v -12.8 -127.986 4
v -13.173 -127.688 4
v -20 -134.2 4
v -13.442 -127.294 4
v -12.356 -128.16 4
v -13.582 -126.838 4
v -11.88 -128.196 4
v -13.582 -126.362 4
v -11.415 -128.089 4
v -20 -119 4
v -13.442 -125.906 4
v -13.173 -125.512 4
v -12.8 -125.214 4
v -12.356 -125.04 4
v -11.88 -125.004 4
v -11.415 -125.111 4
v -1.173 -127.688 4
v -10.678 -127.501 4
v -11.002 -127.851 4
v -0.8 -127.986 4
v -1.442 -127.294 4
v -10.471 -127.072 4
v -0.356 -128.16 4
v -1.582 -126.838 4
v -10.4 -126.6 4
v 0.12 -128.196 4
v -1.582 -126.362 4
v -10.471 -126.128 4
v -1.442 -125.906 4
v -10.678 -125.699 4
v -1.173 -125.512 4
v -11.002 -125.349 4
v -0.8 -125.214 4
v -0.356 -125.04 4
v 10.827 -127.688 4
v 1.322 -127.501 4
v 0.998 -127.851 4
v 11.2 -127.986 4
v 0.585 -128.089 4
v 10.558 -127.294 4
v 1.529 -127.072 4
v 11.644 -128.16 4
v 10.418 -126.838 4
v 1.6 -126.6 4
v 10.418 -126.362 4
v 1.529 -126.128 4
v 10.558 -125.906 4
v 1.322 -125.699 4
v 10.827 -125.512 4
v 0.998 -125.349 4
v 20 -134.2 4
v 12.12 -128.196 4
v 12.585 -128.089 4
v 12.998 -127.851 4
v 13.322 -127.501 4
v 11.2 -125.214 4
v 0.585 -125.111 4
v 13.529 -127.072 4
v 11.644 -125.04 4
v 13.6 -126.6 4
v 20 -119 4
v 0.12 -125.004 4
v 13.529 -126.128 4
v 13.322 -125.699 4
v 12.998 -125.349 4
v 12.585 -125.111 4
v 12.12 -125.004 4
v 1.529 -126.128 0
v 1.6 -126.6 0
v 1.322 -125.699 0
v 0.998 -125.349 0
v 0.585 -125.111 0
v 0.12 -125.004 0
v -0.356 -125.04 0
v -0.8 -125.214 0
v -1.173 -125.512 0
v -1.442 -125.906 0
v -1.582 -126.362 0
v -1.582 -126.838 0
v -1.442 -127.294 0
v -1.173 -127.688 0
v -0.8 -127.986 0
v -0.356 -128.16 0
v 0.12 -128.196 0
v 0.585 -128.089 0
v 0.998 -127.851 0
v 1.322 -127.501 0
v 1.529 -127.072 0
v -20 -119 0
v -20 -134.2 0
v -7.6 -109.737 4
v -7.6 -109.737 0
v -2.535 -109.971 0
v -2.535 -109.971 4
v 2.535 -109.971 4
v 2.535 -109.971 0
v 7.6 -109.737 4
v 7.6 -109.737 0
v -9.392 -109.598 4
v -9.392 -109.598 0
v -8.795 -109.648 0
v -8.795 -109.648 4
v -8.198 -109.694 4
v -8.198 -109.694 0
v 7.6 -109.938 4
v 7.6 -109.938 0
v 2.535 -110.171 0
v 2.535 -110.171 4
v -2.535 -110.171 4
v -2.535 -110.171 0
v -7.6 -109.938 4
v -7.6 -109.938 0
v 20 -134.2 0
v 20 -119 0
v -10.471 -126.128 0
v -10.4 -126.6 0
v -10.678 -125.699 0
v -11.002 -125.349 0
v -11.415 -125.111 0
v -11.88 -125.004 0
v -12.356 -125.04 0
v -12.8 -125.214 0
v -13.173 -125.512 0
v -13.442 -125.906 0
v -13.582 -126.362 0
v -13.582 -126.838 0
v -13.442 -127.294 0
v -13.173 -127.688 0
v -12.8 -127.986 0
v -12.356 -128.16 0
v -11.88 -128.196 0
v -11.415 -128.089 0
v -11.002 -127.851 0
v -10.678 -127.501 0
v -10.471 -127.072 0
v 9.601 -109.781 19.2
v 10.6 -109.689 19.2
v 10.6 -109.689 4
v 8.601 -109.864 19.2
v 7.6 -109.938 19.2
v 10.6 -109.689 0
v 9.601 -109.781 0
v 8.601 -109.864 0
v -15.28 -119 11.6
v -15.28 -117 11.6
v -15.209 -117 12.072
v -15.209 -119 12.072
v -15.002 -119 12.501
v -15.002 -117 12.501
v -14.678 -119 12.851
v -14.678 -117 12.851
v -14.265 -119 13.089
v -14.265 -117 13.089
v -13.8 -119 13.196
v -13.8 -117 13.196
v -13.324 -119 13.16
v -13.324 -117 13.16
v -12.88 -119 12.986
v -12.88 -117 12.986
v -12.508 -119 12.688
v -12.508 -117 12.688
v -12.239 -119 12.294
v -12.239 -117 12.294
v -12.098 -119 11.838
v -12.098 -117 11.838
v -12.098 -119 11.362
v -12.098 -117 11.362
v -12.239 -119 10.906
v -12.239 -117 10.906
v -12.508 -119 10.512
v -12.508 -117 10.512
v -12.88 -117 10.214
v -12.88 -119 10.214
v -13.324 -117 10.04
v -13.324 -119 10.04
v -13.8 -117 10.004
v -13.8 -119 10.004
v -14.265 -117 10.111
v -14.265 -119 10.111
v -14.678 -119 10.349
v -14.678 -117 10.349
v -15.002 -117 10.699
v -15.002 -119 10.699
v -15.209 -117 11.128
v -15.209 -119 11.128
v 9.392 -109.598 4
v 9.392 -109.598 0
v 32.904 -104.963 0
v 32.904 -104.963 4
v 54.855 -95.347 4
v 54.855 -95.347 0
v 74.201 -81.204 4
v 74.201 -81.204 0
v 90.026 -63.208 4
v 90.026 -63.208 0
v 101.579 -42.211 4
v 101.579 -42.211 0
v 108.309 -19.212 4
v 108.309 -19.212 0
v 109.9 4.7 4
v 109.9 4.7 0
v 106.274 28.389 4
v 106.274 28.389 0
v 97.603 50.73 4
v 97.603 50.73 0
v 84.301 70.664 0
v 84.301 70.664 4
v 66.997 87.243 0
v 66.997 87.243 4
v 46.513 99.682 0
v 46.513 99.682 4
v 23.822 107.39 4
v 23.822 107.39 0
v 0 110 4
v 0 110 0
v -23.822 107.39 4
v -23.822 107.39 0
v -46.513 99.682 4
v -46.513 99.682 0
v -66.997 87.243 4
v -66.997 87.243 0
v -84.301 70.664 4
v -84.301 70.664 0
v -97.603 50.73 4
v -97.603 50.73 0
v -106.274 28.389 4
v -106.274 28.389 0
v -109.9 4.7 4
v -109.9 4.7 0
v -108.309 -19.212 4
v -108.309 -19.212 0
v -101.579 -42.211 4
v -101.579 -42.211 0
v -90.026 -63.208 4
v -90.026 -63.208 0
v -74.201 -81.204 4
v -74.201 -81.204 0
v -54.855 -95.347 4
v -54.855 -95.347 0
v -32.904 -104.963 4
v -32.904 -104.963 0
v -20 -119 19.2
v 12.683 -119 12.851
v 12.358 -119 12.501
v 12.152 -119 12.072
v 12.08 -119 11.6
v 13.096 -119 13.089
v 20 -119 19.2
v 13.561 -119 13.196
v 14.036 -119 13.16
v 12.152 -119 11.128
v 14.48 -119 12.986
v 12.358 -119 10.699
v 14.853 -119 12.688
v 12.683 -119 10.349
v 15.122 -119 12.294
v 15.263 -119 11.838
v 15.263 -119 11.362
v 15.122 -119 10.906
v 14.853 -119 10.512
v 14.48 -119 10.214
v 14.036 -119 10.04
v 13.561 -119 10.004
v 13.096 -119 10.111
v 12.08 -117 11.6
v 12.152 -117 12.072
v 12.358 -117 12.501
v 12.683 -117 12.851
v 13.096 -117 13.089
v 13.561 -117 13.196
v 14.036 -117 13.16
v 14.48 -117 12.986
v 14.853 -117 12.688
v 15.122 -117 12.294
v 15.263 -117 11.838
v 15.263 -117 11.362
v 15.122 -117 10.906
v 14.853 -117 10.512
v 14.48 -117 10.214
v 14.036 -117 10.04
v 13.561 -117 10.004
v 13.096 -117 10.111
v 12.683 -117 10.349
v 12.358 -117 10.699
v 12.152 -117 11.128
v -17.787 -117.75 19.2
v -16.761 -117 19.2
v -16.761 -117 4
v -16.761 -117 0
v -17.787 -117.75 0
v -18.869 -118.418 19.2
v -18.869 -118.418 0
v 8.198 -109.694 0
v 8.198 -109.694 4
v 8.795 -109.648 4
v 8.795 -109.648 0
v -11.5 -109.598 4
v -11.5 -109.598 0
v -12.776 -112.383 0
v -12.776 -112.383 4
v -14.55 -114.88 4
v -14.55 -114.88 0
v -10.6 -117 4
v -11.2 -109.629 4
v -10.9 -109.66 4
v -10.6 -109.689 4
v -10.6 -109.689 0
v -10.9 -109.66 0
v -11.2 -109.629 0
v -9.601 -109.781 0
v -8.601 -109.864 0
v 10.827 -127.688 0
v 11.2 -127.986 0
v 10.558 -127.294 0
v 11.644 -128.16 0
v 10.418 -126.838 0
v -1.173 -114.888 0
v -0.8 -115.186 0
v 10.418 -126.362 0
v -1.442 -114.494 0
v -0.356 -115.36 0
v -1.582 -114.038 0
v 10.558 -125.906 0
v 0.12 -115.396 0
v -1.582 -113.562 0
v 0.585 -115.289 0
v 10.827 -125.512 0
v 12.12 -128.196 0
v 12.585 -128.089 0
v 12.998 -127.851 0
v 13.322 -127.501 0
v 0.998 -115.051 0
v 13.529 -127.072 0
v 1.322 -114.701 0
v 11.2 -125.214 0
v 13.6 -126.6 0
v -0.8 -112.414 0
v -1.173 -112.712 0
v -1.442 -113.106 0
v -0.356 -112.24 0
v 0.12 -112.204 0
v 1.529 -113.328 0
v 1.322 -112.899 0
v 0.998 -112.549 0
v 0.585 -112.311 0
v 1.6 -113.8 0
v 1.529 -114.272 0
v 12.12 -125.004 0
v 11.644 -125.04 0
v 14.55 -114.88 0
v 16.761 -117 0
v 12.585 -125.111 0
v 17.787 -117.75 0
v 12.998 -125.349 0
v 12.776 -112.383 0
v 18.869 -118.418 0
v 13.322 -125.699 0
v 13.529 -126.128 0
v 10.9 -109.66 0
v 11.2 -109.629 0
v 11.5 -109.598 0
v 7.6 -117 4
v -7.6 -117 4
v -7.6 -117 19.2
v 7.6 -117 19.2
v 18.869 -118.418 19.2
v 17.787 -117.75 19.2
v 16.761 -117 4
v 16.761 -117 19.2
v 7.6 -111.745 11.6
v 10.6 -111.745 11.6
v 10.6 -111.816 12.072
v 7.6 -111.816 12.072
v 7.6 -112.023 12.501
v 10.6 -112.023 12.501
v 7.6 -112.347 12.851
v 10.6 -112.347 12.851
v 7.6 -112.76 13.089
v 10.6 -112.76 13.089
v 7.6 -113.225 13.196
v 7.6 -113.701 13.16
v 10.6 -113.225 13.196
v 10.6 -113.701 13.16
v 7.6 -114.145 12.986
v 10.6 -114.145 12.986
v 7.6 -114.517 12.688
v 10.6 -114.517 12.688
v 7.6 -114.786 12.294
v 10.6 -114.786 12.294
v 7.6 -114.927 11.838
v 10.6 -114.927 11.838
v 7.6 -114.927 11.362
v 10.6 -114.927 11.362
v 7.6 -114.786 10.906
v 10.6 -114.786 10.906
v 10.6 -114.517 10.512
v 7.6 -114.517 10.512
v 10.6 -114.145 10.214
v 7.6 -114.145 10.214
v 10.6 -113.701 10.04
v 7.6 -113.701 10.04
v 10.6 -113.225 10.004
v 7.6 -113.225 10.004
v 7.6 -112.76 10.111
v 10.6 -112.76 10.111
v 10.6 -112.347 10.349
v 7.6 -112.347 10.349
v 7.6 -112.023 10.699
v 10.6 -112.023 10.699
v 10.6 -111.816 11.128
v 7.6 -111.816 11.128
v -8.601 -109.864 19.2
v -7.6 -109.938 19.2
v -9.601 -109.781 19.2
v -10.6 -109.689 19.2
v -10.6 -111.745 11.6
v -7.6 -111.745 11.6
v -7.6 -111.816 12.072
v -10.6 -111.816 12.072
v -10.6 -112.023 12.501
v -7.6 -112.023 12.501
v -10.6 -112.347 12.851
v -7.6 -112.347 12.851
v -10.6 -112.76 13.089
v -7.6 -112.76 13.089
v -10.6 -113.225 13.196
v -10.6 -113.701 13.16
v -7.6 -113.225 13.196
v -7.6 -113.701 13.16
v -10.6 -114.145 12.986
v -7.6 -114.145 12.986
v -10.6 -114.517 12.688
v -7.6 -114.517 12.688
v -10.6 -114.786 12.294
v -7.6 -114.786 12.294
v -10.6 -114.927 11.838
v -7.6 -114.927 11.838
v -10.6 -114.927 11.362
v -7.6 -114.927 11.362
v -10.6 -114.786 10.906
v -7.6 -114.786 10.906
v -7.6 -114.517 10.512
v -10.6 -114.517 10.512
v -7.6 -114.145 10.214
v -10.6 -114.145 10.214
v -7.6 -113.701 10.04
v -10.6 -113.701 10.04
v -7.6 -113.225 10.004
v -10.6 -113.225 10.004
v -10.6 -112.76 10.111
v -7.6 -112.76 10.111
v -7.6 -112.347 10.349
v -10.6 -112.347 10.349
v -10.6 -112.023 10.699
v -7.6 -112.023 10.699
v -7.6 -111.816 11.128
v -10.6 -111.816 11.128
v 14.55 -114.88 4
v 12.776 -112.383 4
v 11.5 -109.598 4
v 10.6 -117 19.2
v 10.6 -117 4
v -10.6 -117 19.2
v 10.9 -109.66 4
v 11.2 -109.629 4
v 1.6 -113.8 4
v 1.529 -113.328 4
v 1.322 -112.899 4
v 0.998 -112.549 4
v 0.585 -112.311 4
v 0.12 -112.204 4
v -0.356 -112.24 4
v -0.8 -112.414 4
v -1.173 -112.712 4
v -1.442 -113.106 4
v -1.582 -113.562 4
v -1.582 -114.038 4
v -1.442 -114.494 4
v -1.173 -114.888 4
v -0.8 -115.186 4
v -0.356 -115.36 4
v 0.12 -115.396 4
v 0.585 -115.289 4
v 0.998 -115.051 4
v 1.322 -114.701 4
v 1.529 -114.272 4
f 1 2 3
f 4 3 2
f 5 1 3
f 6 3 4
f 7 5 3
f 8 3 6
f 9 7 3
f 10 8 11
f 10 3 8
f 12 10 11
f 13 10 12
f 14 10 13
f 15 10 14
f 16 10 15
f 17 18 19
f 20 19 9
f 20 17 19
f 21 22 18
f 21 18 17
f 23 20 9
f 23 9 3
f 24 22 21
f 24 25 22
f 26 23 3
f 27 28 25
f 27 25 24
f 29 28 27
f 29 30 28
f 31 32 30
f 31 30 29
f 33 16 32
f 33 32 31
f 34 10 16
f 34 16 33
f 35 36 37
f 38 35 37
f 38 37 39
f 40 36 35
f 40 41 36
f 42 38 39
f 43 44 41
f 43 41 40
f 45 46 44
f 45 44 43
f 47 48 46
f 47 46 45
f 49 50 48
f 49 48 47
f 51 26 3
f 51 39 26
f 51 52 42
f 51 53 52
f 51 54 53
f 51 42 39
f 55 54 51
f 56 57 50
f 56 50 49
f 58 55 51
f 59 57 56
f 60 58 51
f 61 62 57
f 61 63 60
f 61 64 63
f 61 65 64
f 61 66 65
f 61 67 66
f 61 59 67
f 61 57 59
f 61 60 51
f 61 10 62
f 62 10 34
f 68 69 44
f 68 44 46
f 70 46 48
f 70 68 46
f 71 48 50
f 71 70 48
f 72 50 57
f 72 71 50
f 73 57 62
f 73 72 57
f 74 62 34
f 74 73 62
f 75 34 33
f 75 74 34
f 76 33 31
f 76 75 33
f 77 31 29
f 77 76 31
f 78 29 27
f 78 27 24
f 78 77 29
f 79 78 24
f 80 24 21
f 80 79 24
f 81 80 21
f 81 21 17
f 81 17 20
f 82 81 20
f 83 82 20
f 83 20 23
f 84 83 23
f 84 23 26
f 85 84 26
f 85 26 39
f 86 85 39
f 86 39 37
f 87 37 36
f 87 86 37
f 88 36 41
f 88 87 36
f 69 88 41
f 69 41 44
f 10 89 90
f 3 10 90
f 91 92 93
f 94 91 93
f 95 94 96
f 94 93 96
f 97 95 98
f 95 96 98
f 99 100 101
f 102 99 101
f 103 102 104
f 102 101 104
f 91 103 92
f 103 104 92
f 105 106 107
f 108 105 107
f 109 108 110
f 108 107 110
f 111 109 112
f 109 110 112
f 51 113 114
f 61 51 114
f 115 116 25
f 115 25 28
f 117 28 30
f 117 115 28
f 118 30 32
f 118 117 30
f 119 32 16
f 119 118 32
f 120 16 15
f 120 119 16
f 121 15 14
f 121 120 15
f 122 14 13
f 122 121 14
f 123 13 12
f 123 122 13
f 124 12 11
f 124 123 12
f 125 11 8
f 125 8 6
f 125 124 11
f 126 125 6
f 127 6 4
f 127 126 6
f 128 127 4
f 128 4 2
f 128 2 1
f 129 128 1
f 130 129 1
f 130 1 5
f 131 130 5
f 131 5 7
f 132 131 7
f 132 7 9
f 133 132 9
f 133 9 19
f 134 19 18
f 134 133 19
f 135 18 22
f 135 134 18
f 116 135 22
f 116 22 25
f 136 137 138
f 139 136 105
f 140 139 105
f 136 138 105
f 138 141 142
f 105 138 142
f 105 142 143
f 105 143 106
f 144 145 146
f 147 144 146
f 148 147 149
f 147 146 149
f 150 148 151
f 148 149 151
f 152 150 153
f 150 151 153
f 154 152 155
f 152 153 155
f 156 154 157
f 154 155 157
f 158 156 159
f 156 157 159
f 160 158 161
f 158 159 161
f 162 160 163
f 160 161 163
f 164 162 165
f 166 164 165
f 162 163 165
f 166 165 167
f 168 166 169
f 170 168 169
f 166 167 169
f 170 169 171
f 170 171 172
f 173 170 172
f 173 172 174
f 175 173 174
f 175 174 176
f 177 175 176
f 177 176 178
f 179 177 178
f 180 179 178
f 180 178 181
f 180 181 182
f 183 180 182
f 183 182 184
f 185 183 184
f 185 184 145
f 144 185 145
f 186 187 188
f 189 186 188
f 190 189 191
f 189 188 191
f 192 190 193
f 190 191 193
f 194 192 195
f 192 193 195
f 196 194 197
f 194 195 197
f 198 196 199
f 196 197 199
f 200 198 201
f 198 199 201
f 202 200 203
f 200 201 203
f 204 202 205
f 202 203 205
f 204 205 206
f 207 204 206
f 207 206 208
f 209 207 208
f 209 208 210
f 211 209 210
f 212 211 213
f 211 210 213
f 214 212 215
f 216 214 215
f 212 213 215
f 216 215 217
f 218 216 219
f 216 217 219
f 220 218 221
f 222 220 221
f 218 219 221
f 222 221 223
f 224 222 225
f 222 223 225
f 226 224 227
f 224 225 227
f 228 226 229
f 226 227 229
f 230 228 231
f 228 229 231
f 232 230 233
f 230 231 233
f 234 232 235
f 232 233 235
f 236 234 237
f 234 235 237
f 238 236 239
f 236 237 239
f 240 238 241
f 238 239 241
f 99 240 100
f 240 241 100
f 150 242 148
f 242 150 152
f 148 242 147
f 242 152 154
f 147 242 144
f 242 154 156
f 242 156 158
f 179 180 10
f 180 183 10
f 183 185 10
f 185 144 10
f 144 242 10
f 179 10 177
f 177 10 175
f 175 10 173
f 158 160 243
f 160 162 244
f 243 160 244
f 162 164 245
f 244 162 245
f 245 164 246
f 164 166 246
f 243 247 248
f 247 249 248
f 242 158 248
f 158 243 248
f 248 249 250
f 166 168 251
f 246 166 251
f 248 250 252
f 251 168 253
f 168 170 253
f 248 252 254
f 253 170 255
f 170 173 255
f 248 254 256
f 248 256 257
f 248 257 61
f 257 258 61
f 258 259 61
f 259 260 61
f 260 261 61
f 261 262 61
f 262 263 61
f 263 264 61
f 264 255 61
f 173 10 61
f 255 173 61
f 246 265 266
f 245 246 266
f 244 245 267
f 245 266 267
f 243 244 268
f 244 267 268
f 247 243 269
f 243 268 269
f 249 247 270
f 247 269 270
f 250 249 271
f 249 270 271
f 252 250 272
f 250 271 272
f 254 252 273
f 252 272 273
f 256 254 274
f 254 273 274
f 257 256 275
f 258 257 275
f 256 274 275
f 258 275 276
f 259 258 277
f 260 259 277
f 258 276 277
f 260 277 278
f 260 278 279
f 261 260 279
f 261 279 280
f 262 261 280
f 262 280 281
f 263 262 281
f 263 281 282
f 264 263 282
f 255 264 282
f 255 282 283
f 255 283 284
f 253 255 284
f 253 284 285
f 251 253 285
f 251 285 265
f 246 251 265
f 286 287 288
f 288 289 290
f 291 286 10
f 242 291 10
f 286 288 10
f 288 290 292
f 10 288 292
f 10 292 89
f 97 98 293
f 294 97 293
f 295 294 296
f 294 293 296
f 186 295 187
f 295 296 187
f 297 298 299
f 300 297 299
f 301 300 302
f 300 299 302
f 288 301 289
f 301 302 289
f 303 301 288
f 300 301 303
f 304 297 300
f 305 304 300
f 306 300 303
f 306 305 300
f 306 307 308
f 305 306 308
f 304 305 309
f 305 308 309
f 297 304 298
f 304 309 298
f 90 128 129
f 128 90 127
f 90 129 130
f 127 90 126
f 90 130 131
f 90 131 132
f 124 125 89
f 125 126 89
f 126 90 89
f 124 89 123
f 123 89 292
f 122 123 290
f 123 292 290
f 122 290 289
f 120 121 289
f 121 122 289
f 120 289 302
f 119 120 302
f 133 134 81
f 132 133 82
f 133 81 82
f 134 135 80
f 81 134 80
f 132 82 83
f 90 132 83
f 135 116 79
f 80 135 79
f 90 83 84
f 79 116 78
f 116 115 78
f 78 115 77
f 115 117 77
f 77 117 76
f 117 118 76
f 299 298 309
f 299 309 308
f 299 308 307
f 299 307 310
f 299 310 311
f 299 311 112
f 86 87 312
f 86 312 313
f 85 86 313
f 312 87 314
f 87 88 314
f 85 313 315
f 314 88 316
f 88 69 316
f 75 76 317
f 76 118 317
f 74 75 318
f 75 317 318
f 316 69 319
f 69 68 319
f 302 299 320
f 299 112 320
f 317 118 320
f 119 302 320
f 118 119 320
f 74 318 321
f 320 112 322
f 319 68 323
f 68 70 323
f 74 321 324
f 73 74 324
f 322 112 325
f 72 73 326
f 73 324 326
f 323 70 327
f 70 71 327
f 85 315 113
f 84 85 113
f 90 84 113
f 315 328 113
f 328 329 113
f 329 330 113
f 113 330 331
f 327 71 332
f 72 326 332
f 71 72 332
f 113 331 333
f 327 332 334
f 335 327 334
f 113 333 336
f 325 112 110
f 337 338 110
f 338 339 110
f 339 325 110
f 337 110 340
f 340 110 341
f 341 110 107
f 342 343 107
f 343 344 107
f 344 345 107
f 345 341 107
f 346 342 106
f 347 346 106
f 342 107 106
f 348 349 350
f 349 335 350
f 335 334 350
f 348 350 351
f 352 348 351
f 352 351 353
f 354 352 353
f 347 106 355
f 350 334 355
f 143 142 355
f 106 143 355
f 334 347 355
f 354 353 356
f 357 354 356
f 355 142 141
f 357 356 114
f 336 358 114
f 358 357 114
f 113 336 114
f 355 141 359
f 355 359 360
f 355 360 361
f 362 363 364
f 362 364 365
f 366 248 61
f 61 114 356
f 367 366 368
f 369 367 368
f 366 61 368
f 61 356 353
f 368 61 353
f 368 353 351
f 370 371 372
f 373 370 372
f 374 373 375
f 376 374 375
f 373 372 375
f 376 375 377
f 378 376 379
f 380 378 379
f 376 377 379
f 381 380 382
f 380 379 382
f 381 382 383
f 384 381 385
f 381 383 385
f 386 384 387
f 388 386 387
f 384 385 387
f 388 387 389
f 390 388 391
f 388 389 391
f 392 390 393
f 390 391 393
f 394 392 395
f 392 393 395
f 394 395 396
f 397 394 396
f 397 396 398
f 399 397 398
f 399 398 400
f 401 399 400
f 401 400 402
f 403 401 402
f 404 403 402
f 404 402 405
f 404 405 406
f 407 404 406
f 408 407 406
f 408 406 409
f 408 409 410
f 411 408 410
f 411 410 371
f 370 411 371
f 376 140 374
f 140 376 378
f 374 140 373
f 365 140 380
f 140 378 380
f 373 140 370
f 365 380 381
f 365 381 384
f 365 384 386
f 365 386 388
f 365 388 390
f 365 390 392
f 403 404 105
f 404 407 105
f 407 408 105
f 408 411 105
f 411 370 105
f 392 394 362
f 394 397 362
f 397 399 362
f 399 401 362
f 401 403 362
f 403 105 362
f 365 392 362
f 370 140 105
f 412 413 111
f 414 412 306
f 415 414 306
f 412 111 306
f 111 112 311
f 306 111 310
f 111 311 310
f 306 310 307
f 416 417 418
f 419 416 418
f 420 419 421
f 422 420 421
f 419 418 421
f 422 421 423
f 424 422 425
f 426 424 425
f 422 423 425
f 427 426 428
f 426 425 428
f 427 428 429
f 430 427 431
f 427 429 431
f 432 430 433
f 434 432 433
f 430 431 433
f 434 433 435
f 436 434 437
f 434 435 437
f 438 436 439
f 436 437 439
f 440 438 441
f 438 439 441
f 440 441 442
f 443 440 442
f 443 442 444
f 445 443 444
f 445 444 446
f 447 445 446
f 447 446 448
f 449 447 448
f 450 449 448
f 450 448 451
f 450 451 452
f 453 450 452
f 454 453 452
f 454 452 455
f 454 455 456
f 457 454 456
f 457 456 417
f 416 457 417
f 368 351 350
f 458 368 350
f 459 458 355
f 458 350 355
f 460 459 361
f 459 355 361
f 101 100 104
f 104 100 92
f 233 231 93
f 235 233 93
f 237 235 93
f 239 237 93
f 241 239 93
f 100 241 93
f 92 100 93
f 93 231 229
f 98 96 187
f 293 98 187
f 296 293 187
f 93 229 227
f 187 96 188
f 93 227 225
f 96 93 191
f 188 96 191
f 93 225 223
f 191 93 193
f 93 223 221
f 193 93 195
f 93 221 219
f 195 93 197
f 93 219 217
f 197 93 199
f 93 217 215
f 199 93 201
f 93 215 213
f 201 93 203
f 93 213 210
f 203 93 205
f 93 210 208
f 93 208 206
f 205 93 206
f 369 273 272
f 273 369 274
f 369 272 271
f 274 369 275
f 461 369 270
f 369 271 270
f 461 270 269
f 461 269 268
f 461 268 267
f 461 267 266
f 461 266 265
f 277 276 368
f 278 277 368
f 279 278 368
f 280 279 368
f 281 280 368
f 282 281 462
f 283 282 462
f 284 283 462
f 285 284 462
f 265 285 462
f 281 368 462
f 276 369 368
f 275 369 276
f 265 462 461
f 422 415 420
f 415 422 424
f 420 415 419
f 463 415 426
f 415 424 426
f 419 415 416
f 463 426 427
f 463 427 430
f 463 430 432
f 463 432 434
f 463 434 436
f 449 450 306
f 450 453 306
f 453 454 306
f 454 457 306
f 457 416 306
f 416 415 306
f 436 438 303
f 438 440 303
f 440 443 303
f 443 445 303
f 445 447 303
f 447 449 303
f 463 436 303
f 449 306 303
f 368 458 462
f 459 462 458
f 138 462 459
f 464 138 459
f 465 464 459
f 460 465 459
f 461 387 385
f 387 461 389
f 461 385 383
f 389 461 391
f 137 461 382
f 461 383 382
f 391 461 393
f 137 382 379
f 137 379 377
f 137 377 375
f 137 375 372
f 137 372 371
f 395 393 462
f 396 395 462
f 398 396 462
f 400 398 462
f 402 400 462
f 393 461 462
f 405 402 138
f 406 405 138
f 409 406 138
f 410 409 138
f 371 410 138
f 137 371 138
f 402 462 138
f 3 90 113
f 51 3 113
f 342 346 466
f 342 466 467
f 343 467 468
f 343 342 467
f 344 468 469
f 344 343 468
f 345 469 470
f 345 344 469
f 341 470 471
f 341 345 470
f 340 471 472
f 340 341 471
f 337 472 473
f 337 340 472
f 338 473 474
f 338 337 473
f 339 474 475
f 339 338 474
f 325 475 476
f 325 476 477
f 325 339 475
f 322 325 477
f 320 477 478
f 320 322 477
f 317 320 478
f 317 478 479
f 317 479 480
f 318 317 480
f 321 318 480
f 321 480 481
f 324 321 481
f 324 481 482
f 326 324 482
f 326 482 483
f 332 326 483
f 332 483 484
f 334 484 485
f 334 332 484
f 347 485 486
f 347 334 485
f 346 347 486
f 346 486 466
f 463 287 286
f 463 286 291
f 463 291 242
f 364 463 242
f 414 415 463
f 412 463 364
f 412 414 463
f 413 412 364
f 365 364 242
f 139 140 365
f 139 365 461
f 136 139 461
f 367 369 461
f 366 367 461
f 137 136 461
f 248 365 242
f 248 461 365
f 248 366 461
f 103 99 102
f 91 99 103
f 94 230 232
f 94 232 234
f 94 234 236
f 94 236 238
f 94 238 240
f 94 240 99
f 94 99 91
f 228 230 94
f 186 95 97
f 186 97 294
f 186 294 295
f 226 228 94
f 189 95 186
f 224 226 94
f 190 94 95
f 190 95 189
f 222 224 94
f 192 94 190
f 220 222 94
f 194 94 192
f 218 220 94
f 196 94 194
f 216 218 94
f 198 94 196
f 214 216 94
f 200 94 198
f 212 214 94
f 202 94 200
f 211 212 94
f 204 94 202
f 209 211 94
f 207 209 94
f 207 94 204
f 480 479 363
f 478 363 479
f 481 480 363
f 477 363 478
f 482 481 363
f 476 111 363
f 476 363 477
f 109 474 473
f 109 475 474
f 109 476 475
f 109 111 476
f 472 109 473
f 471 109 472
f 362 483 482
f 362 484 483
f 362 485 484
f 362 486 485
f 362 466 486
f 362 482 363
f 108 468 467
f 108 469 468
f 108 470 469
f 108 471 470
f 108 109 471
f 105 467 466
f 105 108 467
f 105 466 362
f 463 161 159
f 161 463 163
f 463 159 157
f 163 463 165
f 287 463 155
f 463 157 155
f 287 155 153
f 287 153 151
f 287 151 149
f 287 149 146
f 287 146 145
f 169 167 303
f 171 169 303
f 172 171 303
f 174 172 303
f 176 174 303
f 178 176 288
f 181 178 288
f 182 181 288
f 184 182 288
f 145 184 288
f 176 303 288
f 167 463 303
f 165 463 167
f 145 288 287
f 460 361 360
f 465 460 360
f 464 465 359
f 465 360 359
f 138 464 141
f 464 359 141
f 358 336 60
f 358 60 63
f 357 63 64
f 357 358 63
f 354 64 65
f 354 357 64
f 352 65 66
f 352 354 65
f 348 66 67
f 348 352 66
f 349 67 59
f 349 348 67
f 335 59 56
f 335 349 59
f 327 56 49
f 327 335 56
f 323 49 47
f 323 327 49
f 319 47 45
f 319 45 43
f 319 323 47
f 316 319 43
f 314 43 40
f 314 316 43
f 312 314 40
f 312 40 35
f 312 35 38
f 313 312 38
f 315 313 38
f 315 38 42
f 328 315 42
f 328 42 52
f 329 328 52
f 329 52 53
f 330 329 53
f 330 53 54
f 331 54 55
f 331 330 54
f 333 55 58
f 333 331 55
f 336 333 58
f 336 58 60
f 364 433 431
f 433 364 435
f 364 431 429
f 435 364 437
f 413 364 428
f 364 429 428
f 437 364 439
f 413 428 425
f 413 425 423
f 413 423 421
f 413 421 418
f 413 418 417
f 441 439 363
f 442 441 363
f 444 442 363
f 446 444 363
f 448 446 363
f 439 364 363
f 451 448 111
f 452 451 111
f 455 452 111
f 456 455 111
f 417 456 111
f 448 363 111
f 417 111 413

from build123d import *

# Parameters (mm, degrees)
F1_R     = 1.6
F2_DEPTH = 4
F1_W     = 15.2
F1_H     = 2
F3_DEPTH = 19.2
F4_DEPTH = 4
F5_R     = 1.6
F6_DEPTH = 30.601
F7_R     = 1.6
F8_DEPTH = 17.201
F9_DEPTH = 4


# Not quite as in the source:
# - a feature names something its author has since deleted; it is built from what else it names


with BuildPart() as f2:
    # F1 (on Top) → F2 (new body)
    with BuildSketch(Plane.XY):
        Polygon((7.6, -119), (-7.6, -119), (-10.6, -119), (-20, -119), (-20, -134.2), (20, -134.2), (20, -119), (10.6, -119), align=None)
        with Locations((-12, -126.6)):
            Circle(F1_R, mode=Mode.SUBTRACT)
        with Locations((0, -126.6)):
            Circle(F1_R, mode=Mode.SUBTRACT)
        with Locations((12, -126.6)):
            Circle(F1_R, mode=Mode.SUBTRACT)
    extrude(amount=F2_DEPTH)

    # F1 (on Top) → F3 (join)
    with BuildSketch(Plane.XY):
        with BuildLine():
            Line((-7.6, -117), (-7.6, -109.9376186753))
            ThreePointArc((-7.6, -109.9376186753), (-9.1008489139, -109.8235609924), (-10.6, -109.6890149468))
            Line((-10.6, -109.6890149468), (-10.6, -117))
            Line((-10.6, -117), (-10.6, -119))
            Line((-10.6, -119), (-7.6, -119))
            Line((-7.6, -119), (-7.6, -117))
        make_face()
        with BuildLine():
            Line((-10.6, -117), (-16.7608435117, -117))
            ThreePointArc((-16.7608435117, -117), (-18.3217751354, -118.0949827906), (-20, -119))
            Line((-20, -119), (-10.6, -119))
            Line((-10.6, -119), (-10.6, -117))
        make_face()
        with Locations((0, -118)):
            Rectangle(F1_W, F1_H)
        with BuildLine():
            ThreePointArc((10.6, -109.6890149468), (9.1008489139, -109.8235609924), (7.6, -109.9376186753))
            Line((7.6, -109.9376186753), (7.6, -117))
            Line((7.6, -117), (7.6, -119))
            Line((7.6, -119), (10.6, -119))
            Line((10.6, -119), (10.6, -117))
            Line((10.6, -117), (10.6, -109.6890149468))
        make_face()
        with BuildLine():
            ThreePointArc((20, -119), (18.3217751354, -118.0949827906), (16.7608435117, -117))
            Line((16.7608435117, -117), (10.6, -117))
            Line((10.6, -117), (10.6, -119))
            Line((10.6, -119), (20, -119))
        make_face()
    extrude(amount=F3_DEPTH)

    # F1 (on Top) → F4 (join)
    with BuildSketch(Plane.XY):
        with BuildLine():
            ThreePointArc((7.6, -109.9376186753), (0, -110.2), (-7.6, -109.9376186753))
            Line((-7.6, -109.9376186753), (-7.6, -117))
            Line((-7.6, -117), (7.6, -117))
            Line((7.6, -117), (7.6, -109.9376186753))
        make_face()
        with Locations((0, -113.8)):
            Circle(F1_R, mode=Mode.SUBTRACT)
        with BuildLine():
            ThreePointArc((16.7608435117, -117), (13.6040282901, -113.6732968412), (11.5, -109.5983120308))
            ThreePointArc((11.5, -109.5983120308), (11.0500930654, -109.6445869309), (10.6, -109.6890149468))
            Line((10.6, -109.6890149468), (10.6, -117))
            Line((10.6, -117), (16.7608435117, -117))
        make_face()
        with BuildLine():
            ThreePointArc((-10.6, -109.6890149468), (-11.0500930654, -109.6445869309), (-11.5, -109.5983120308))
            ThreePointArc((-11.5, -109.5983120308), (-13.6040282901, -113.6732968412), (-16.7608435117, -117))
            Line((-16.7608435117, -117), (-10.6, -117))
            Line((-10.6, -117), (-10.6, -109.6890149468))
        make_face()
    extrude(amount=F4_DEPTH)

    # F5 (on face) → F6 (cut, through all)
    with BuildSketch(Plane.YZ.offset(10.6)):
        with Locations((-113.3445074734, 11.6)):
            Circle(F5_R)
    extrude(amount=-F6_DEPTH, mode=Mode.SUBTRACT)

    # F7 (on face) → F8 (cut, through all)
    with BuildSketch(Plane(origin=(0, -117, 0), x_dir=(-1, 0, 0), z_dir=(0, 1, 0))):
        with Locations((-13.6804217559, 11.6)):
            Circle(F7_R)
        with Locations((13.6804217559, 11.6)):
            Circle(F7_R)
    extrude(amount=-F8_DEPTH, mode=Mode.SUBTRACT)


with BuildPart() as f9:
    # F1 (on Top) → F9 (new body)
    with BuildSketch(Plane.XY):
        with BuildLine():
            ThreePointArc((9.3920178876, -109.5983120308), (81.0343197899, -74.3870890423), (110, 0))
            ThreePointArc((110, 0), (-74.3870890423, 81.0343197899), (-9.3920178876, -109.5983120308))
            Line((-9.3920178876, -109.5983120308), (-7.6, -109.5983120308))
            Line((-7.6, -109.5983120308), (7.6, -109.5983120308))
            Line((7.6, -109.5983120308), (9.3920178876, -109.5983120308))
        make_face()
        with BuildLine():
            Line((-7.6, -109.5983120308), (-7.6, -109.7371404767))
            ThreePointArc((-7.6, -109.7371404767), (0, -110), (7.6, -109.7371404767))
            Line((7.6, -109.7371404767), (7.6, -109.5983120308))
            Line((7.6, -109.5983120308), (-7.6, -109.5983120308))
        make_face()
        with BuildLine():
            Line((-7.6, -109.5983120308), (-9.3920178876, -109.5983120308))
            ThreePointArc((-9.3920178876, -109.5983120308), (-8.4962925036, -109.6713864857), (-7.6, -109.7371404767))
            Line((-7.6, -109.7371404767), (-7.6, -109.5983120308))
        make_face()
        with BuildLine():
            ThreePointArc((7.6, -109.7371404767), (8.4962925036, -109.6713864857), (9.3920178876, -109.5983120308))
            Line((9.3920178876, -109.5983120308), (7.6, -109.5983120308))
            Line((7.6, -109.5983120308), (7.6, -109.7371404767))
        make_face()
    extrude(amount=F9_DEPTH)


solid = Compound([f2.part, f9.part])
